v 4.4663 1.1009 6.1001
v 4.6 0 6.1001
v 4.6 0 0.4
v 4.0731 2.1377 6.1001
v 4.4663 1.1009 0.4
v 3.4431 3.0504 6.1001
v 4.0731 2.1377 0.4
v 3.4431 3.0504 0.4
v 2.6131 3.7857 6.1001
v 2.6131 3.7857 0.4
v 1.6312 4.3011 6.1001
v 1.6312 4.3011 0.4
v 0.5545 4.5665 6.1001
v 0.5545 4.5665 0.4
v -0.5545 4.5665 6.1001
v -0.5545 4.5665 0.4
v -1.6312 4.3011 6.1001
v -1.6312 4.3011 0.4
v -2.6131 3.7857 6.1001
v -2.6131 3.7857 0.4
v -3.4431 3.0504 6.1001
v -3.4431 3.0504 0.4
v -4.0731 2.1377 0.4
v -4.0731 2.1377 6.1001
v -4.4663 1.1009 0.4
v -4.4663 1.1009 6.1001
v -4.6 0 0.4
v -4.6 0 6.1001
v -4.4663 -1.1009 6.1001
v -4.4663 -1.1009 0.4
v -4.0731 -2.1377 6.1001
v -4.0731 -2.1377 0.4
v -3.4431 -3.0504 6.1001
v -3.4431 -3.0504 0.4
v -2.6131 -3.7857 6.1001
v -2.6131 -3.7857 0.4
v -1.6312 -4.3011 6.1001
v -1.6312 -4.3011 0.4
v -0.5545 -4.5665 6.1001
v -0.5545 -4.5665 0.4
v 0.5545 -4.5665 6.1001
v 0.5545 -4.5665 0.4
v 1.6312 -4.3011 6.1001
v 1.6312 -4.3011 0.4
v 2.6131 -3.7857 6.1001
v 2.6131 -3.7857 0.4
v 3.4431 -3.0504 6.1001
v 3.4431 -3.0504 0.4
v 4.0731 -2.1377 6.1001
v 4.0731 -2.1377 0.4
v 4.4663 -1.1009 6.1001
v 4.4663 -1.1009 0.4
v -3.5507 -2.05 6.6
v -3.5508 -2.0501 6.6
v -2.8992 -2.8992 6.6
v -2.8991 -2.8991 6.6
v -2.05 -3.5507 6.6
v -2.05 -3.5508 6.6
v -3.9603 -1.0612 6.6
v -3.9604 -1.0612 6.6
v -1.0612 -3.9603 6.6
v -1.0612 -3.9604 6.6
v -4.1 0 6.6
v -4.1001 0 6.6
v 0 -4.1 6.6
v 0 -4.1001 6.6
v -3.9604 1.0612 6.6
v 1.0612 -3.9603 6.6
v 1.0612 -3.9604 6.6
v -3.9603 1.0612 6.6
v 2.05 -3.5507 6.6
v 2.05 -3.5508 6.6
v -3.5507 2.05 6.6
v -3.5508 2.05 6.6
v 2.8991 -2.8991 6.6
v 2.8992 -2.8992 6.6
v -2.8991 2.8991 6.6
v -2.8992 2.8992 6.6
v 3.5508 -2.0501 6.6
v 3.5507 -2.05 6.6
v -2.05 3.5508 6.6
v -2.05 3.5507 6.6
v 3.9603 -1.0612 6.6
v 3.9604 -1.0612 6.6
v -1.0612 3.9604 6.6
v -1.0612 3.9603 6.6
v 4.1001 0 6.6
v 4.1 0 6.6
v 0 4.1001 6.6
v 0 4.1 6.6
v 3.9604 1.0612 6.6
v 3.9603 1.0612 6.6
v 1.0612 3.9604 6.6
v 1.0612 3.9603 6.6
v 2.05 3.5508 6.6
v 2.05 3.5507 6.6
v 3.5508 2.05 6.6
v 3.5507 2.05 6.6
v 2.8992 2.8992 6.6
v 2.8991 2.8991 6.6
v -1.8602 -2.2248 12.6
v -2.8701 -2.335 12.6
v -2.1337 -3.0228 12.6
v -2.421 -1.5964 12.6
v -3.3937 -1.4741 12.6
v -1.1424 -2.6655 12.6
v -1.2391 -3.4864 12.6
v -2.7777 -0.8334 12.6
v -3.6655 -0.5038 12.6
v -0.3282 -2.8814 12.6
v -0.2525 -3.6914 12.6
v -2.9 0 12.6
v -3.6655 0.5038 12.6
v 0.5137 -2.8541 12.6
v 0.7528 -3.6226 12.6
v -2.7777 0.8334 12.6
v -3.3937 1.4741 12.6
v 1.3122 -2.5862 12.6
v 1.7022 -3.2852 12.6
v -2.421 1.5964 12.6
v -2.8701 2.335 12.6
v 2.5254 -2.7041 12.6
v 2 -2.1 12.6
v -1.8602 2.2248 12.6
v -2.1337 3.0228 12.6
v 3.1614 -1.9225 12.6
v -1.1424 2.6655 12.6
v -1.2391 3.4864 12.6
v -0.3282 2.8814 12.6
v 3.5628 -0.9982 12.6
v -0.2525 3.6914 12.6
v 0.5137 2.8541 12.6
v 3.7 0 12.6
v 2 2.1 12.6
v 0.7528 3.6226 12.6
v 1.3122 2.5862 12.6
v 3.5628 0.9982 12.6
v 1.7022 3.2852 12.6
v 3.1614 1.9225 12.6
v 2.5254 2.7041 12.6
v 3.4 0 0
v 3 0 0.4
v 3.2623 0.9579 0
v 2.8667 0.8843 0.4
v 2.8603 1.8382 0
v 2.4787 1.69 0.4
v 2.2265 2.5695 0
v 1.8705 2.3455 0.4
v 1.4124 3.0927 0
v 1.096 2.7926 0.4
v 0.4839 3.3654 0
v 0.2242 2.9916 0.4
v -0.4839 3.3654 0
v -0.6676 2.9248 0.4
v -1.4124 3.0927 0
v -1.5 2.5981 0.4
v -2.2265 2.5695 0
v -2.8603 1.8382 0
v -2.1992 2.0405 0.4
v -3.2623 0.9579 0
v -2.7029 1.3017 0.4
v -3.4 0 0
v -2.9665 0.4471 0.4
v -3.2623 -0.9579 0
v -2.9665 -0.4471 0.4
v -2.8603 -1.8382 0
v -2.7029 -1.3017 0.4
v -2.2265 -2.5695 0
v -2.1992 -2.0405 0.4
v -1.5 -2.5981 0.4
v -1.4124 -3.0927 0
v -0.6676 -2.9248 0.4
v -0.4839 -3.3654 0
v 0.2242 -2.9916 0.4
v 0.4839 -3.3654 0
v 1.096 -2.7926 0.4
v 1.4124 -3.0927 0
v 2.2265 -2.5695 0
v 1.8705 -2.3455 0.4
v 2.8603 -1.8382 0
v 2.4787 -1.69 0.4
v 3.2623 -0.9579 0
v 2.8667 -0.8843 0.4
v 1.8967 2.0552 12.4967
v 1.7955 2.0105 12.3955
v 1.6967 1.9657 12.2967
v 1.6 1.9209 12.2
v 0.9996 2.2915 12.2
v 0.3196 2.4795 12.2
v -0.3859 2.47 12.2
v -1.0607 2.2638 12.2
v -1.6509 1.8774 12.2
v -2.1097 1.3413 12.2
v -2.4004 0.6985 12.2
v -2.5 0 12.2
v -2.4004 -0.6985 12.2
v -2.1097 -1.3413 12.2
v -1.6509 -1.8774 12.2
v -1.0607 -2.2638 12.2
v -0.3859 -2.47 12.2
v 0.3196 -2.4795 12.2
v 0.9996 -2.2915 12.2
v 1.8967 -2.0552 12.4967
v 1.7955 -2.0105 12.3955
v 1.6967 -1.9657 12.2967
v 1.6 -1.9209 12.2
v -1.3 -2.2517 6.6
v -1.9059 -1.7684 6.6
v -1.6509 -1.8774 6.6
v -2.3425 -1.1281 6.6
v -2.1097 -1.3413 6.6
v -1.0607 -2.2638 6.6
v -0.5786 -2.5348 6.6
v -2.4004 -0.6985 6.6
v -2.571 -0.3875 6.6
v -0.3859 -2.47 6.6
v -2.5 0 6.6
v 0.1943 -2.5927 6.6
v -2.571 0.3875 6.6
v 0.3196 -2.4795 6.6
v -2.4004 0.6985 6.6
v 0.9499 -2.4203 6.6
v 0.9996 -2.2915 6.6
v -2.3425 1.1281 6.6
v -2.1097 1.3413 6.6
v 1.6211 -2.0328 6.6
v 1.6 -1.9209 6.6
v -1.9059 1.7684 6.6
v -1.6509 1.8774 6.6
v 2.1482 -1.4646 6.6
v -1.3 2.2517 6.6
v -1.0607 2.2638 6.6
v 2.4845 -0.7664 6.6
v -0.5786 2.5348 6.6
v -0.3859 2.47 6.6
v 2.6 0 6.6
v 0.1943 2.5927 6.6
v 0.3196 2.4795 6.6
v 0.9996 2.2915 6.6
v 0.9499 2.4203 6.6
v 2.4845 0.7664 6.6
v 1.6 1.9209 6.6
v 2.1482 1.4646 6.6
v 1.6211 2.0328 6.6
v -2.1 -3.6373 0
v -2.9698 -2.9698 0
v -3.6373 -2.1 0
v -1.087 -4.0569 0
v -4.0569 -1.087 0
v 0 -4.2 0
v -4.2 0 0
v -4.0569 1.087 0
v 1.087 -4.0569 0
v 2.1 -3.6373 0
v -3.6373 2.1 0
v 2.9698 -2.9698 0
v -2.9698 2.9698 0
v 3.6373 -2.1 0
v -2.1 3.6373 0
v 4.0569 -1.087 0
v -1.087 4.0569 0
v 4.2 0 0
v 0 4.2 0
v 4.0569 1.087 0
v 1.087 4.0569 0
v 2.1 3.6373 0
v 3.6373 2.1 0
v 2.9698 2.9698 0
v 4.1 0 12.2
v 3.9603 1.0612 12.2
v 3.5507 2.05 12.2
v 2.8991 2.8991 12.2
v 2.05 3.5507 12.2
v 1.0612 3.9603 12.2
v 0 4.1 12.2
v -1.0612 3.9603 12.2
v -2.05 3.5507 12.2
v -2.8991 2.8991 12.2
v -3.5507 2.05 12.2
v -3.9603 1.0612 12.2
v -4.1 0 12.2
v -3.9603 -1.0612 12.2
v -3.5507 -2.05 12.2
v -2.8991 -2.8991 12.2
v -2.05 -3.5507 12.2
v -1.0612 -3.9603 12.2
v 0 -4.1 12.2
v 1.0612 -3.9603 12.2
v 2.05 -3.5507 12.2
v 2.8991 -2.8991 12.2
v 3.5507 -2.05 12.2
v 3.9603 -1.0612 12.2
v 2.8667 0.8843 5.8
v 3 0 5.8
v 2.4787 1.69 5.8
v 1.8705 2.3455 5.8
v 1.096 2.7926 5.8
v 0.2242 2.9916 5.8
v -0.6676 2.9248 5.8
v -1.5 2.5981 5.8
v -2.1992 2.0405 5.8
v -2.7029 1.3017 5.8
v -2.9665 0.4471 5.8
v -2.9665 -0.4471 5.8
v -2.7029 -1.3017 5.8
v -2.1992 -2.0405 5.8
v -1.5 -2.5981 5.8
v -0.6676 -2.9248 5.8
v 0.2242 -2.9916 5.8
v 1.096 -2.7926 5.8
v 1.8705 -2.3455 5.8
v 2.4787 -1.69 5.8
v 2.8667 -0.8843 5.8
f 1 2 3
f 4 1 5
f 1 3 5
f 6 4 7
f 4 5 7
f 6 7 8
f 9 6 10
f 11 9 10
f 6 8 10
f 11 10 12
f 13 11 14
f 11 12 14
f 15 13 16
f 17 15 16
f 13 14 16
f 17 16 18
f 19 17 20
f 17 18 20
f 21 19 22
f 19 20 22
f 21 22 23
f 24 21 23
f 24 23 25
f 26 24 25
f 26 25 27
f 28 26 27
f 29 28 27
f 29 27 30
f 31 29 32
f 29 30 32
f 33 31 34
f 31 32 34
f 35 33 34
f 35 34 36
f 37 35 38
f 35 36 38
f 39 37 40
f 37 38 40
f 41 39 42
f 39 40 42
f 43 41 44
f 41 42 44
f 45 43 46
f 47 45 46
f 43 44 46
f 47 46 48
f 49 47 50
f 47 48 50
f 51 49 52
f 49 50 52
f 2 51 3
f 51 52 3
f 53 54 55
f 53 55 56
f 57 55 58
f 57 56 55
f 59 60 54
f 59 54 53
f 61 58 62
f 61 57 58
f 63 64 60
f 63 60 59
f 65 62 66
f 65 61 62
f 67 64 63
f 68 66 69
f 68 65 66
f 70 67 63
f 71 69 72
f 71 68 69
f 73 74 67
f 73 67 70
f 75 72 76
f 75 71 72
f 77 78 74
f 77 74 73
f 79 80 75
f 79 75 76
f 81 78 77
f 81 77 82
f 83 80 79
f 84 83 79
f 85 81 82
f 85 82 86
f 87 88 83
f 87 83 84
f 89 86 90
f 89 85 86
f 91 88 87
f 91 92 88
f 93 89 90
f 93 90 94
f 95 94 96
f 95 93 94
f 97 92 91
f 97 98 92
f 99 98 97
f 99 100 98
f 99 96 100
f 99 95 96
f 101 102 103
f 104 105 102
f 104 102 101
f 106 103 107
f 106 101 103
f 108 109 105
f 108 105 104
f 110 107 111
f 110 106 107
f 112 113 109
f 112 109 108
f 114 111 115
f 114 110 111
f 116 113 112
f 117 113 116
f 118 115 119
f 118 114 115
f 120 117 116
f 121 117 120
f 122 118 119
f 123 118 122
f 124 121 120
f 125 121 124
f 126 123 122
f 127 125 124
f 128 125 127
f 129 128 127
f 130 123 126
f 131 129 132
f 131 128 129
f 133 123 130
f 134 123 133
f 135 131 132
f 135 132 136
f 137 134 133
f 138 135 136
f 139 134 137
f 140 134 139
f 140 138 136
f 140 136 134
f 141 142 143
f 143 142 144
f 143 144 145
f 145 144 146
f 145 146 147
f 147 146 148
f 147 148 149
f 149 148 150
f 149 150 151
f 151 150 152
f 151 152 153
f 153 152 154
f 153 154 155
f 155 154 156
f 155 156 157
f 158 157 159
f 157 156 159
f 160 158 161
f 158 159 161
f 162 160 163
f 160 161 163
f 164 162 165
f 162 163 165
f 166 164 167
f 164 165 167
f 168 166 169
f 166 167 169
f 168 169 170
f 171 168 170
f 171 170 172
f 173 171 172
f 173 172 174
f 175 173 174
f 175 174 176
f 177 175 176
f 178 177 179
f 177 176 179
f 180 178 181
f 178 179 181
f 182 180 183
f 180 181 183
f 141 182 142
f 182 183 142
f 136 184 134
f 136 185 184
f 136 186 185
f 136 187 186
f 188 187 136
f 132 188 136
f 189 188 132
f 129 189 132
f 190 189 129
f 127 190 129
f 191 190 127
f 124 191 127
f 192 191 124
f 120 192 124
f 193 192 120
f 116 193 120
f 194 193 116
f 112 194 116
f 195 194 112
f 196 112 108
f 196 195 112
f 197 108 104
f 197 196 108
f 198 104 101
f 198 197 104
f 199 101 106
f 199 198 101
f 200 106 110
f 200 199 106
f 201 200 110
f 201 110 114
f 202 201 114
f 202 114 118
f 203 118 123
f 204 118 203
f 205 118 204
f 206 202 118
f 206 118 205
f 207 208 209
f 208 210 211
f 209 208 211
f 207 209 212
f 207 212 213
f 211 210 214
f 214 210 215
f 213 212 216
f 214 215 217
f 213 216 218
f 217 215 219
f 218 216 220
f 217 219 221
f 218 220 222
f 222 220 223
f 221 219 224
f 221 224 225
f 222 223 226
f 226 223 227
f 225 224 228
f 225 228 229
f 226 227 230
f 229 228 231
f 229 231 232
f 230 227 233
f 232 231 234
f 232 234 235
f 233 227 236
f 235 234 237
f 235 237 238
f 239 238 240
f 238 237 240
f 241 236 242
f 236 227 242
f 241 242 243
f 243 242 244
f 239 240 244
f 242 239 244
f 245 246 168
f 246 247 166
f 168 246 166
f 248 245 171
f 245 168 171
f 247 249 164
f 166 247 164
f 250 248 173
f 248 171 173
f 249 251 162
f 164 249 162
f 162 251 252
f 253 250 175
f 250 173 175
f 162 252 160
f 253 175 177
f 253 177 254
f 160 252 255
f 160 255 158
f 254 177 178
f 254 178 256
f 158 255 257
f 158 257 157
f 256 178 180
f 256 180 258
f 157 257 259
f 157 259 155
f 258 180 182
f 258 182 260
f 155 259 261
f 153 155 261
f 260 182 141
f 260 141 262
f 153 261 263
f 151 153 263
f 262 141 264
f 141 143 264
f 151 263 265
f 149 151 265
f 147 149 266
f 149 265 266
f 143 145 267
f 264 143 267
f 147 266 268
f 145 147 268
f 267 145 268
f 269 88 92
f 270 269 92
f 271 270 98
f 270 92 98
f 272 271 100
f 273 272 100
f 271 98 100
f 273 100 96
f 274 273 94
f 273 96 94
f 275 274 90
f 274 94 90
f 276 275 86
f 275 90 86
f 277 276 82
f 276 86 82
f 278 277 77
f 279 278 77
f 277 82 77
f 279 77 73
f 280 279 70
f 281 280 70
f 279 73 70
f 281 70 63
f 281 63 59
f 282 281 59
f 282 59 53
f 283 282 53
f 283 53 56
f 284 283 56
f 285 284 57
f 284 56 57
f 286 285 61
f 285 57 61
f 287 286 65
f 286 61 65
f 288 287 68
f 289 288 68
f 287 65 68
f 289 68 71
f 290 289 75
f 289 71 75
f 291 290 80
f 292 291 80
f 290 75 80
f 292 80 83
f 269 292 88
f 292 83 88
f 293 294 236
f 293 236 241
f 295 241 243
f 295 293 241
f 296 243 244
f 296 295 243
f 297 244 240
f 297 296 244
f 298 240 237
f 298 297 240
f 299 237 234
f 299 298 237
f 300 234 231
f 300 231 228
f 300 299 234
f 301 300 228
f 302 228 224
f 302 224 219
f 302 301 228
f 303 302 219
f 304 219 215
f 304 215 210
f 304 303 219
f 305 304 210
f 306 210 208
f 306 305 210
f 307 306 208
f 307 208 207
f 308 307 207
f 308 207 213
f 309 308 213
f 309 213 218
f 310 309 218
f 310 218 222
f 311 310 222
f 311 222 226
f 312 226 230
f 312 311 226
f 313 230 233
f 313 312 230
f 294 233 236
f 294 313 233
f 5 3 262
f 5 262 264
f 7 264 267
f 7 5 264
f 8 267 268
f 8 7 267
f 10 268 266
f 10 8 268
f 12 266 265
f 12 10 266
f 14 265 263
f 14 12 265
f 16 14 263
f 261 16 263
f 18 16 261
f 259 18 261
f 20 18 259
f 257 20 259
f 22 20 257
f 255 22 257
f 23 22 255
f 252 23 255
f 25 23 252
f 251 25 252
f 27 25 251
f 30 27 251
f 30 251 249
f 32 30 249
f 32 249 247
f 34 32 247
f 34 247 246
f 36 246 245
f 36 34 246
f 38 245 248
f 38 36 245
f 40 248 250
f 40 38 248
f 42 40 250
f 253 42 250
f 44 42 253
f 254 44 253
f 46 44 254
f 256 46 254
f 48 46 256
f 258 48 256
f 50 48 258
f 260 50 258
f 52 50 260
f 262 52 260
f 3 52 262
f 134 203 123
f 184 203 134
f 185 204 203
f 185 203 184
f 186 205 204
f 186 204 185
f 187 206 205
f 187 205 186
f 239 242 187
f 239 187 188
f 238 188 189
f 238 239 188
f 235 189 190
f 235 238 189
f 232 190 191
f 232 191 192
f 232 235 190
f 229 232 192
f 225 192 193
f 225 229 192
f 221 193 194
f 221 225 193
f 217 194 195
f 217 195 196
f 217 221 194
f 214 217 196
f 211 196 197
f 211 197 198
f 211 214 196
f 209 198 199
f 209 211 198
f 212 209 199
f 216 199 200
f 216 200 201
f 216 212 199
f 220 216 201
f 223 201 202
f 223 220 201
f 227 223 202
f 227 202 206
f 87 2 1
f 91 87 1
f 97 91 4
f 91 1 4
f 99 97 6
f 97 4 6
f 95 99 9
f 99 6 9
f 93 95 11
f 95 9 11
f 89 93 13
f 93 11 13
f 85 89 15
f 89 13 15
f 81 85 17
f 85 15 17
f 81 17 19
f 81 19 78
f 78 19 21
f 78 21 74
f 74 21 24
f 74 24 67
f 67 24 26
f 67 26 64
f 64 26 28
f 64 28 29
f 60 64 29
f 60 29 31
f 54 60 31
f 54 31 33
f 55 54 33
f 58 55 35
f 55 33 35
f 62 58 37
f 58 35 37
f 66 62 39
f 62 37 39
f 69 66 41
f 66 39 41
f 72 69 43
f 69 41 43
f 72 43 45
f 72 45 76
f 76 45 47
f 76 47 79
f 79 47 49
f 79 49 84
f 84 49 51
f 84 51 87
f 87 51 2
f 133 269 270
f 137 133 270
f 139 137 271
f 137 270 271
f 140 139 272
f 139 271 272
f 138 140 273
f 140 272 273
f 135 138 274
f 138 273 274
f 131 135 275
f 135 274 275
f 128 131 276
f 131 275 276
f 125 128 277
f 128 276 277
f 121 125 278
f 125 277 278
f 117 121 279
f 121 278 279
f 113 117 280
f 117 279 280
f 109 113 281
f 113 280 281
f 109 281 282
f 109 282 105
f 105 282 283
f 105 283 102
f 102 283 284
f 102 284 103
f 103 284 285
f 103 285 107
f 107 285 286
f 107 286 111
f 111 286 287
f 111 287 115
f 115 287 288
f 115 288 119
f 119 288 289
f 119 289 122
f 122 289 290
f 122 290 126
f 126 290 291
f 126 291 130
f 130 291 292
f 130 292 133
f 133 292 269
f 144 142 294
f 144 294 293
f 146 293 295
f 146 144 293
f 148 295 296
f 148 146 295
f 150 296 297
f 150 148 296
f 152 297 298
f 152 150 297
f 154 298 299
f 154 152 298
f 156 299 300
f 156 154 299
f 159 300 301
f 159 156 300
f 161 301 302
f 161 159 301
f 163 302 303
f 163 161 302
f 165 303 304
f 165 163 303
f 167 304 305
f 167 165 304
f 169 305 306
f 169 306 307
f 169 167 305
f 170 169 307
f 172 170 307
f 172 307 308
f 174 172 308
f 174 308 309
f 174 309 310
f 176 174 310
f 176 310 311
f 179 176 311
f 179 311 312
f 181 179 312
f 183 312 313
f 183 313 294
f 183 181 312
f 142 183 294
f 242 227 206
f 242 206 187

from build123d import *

# Parameters (mm, degrees)
SKETCH1_R           = 4.6
SKETCH1_R_2         = 3
BOSS_EXTRUDE1_DEPTH = 6.6
SKETCH2_R           = 4.1
BOSS_EXTRUDE2_DEPTH = 6
CHAMFER2_SIZE       = 0.5
CHAMFER3_SIZE       = 0.4
CHAMFER4_SIZE       = 0.4
CHAMFER4_SIZE2      = 0.8
CHAMFER5_SIZE       = 0.4


with BuildPart() as part:
    # Sketch1 → Boss-Extrude1 (new body)
    with BuildSketch(Plane.XY):
        Circle(SKETCH1_R)
        Circle(SKETCH1_R_2, mode=Mode.SUBTRACT)
    extrude(amount=BOSS_EXTRUDE1_DEPTH)

    # Sketch2 → Boss-Extrude2 (add)
    with BuildSketch(Plane.XY.offset(6.6)):
        Circle(SKETCH2_R)
        with BuildLine():
            Line((1.6, -1.920937271), (1.6, 1.920937271))
            ThreePointArc((1.6, 1.920937271), (-2.5, 0), (1.6, -1.920937271))
        make_face(mode=Mode.SUBTRACT)
    extrude(amount=BOSS_EXTRUDE2_DEPTH)

    # Chamfer2
    chamfer2_edges = [part.edges().sort_by_distance(p)[0] for p in [
        (-4.6, 0, 6.6),
    ]]
    chamfer(chamfer2_edges, length=CHAMFER2_SIZE - 0.0001)  # a hair under: the kernel refuses the full size

    # Chamfer3
    chamfer3_edges = [part.edges().sort_by_distance(p)[0] for p in [
        (-2.5, 0, 12.6),
        (1.6, 0, 12.6),
        (-3, 0, 0),
    ]]
    chamfer(chamfer3_edges, length=CHAMFER3_SIZE)

    # Chamfer4
    chamfer4_edges = [part.edges().sort_by_distance(p)[0] for p in [
        (-3, 0, 6.6),
    ]]
    chamfer4_side = [part.faces().sort_by_distance(p)[0] for p in [
        (-2.915147186, 0, 6.6),
    ]]
    chamfer(chamfer4_edges, length=CHAMFER4_SIZE, length2=CHAMFER4_SIZE2, reference=chamfer4_side[0])

    # Chamfer5
    chamfer5_edges = [part.edges().sort_by_distance(p)[0] for p in [
        (-4.1, 0, 12.6),
        (-4.6, 0, 0),
    ]]
    chamfer(chamfer5_edges, length=CHAMFER5_SIZE)


solid = part.part
